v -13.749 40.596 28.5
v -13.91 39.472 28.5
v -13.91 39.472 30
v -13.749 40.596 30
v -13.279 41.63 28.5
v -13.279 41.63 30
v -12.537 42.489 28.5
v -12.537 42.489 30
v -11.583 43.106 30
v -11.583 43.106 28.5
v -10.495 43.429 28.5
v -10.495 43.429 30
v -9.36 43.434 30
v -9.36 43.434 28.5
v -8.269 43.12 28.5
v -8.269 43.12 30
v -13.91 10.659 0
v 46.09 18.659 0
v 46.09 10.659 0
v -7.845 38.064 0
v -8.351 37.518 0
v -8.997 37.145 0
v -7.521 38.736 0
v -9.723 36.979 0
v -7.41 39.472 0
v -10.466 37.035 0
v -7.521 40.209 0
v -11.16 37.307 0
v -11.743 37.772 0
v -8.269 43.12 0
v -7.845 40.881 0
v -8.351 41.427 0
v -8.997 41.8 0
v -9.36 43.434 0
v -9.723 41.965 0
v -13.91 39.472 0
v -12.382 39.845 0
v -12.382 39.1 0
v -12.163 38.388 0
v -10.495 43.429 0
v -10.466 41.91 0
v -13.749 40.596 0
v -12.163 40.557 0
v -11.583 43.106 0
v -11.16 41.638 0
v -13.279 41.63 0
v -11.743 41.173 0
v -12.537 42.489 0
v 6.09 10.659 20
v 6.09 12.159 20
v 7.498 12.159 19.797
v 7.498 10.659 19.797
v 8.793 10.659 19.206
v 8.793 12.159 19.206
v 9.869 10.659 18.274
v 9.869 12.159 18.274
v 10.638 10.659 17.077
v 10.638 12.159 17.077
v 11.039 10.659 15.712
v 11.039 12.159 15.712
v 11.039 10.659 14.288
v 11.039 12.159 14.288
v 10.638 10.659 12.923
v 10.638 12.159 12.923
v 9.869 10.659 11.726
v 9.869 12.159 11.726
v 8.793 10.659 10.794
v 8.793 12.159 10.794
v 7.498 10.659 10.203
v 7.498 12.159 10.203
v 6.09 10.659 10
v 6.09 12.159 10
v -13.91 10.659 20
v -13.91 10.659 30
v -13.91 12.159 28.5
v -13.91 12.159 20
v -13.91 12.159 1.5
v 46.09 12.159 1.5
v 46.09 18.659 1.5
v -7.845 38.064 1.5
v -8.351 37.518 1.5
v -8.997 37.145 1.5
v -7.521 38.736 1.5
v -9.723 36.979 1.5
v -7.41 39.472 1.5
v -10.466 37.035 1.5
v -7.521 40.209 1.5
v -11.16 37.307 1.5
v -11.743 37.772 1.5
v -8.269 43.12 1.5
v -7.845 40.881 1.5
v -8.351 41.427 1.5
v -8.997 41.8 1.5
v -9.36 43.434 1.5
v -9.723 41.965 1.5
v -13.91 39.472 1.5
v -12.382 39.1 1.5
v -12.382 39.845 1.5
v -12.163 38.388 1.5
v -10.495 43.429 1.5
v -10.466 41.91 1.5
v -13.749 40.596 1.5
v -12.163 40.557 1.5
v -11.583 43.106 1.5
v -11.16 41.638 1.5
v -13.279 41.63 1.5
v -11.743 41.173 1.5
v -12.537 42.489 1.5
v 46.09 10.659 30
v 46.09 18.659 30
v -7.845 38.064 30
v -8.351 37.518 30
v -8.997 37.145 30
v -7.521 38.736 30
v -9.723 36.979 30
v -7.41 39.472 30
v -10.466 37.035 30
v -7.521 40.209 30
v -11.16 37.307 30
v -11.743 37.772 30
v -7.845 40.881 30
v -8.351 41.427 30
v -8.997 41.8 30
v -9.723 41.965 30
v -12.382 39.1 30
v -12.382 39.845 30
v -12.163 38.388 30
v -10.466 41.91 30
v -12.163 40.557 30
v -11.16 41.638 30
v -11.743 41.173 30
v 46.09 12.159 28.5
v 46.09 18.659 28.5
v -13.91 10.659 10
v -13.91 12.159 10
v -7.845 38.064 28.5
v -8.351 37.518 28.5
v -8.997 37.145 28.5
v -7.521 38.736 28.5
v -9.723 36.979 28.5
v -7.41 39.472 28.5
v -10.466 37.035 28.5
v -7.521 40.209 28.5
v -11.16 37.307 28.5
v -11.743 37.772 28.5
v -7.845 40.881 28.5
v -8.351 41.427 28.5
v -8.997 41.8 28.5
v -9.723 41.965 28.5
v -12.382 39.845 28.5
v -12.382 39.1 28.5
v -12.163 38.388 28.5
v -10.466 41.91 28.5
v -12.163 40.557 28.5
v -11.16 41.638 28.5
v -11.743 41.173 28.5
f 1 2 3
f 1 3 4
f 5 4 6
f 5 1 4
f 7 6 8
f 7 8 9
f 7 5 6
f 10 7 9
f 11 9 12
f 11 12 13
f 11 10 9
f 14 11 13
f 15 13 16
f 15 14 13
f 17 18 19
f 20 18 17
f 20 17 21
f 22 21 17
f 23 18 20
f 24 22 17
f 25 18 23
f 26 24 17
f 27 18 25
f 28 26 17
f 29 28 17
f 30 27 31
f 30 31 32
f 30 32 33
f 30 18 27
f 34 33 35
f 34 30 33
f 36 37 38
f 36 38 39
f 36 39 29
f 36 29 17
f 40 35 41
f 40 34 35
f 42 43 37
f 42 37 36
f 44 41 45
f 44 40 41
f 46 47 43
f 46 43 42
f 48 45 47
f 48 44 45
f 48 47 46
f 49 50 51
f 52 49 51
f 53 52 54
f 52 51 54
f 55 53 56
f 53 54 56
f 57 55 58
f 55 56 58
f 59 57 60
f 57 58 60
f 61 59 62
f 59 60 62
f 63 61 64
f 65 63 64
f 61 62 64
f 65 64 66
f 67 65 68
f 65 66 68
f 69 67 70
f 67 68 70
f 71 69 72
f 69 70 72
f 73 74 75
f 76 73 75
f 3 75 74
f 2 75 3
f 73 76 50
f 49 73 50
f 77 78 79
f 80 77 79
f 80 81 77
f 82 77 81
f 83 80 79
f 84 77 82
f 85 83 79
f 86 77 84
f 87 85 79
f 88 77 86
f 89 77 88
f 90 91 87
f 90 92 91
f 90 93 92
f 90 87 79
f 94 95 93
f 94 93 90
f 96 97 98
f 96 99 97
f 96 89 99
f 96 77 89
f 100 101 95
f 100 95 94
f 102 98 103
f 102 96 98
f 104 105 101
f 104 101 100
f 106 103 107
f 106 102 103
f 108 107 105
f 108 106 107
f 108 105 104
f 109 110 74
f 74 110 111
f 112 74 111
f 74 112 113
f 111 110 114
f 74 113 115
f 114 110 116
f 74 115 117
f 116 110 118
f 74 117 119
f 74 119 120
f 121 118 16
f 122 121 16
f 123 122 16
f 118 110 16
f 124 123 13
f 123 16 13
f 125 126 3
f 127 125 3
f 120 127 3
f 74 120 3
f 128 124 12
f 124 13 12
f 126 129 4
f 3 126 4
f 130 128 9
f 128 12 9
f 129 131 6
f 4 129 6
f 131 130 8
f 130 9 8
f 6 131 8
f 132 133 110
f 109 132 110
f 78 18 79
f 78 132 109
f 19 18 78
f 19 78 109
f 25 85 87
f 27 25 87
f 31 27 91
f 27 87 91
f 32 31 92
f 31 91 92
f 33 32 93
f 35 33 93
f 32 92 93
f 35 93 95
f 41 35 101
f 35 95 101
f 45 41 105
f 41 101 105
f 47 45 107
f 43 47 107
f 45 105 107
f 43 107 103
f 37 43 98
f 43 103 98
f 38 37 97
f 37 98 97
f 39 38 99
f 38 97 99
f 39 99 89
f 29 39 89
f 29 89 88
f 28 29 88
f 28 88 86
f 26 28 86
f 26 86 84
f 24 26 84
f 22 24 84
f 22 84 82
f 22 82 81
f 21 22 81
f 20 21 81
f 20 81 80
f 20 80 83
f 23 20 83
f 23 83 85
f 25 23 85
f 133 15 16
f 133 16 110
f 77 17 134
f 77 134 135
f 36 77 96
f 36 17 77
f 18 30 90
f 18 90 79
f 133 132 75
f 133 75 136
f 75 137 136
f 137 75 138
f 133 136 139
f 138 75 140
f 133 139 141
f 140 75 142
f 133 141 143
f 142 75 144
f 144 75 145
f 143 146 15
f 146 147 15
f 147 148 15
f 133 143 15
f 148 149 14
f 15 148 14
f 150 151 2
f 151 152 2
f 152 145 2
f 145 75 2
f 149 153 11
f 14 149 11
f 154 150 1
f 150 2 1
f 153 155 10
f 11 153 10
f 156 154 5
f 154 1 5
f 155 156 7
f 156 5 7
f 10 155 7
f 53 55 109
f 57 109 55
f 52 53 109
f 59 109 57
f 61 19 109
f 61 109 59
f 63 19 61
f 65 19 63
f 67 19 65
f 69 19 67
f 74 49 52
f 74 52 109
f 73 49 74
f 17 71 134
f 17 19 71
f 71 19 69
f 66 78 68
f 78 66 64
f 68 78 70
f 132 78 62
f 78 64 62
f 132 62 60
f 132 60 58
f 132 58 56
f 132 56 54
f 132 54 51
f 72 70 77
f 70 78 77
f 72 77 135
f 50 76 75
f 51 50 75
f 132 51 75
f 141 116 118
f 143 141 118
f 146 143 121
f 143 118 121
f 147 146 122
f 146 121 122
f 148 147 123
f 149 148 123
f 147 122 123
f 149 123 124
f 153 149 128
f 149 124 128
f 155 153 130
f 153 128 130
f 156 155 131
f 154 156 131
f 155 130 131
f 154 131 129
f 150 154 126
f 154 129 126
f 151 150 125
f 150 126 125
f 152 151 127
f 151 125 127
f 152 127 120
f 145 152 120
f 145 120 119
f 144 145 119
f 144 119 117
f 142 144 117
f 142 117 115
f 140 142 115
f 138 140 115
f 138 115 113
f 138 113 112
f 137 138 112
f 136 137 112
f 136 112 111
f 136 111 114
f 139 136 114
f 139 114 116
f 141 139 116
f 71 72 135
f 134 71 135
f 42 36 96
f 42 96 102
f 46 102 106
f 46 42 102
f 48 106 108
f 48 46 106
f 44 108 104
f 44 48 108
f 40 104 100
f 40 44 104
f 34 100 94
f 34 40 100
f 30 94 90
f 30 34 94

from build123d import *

# Parameters (mm, degrees)
SALIENTE_EXTRUIR1_DEPTH = 30
CROQUIS2_R              = 2.5
CORTAR_EXTRUIR1_DEPTH   = 71.10083252
CROQUIS3_W              = 27
CROQUIS3_H              = 62.627315121
CORTAR_EXTRUIR2_DEPTH   = 72
CORTAR_EXTRUIR3_DEPTH   = 64.283609709


with BuildPart() as part:
    # Croquis1 → Saliente-Extruir1 (new body)
    with BuildSketch(Plane.XY):
        with BuildLine():
            Line((-13.910195184, 10.658823529), (-13.910195184, 39.47248109))
            ThreePointArc((-13.910195184, 39.47248109), (-12.082079753, 42.831486511), (-8.268736475, 43.12016711))
            Line((-8.268736475, 43.12016711), (46.089804816, 18.658823529))
            Line((46.089804816, 18.658823529), (46.089804816, 10.658823529))
            Line((46.089804816, 10.658823529), (-13.910195184, 10.658823529))
        make_face()
    extrude(amount=SALIENTE_EXTRUIR1_DEPTH)

    # Croquis2 → Cortar-Extruir1 (cut, through all)
    with BuildSketch(Plane.XY.offset(30)):
        with Locations((-9.910195184, 39.47248109)):
            Circle(CROQUIS2_R)
    extrude(amount=-CORTAR_EXTRUIR1_DEPTH, mode=Mode.SUBTRACT)

    # Croquis3 → Cortar-Extruir2 (cut)
    with BuildSketch(Plane.ZY.offset(13.910195184)):
        with Locations((15, 43.47248109)):
            Rectangle(CROQUIS3_W, CROQUIS3_H)
    extrude(amount=-CORTAR_EXTRUIR2_DEPTH, mode=Mode.SUBTRACT)

    # Croquis4 → Cortar-Extruir3 (cut, through all)
    with BuildSketch(Plane(origin=(0, 12.158823529, 0), x_dir=(1, 0, 0), z_dir=(0, 1, 0))):
        with BuildLine():
            Line((-33.910195184, -20), (6.089804816, -20))
            ThreePointArc((6.089804816, -20), (11.089804816, -15), (6.089804816, -10))
            Line((6.089804816, -10), (-33.910195184, -10))
            Line((-33.910195184, -10), (-33.910195184, -20))
        make_face()
    extrude(amount=-CORTAR_EXTRUIR3_DEPTH, mode=Mode.SUBTRACT)


solid = part.part
